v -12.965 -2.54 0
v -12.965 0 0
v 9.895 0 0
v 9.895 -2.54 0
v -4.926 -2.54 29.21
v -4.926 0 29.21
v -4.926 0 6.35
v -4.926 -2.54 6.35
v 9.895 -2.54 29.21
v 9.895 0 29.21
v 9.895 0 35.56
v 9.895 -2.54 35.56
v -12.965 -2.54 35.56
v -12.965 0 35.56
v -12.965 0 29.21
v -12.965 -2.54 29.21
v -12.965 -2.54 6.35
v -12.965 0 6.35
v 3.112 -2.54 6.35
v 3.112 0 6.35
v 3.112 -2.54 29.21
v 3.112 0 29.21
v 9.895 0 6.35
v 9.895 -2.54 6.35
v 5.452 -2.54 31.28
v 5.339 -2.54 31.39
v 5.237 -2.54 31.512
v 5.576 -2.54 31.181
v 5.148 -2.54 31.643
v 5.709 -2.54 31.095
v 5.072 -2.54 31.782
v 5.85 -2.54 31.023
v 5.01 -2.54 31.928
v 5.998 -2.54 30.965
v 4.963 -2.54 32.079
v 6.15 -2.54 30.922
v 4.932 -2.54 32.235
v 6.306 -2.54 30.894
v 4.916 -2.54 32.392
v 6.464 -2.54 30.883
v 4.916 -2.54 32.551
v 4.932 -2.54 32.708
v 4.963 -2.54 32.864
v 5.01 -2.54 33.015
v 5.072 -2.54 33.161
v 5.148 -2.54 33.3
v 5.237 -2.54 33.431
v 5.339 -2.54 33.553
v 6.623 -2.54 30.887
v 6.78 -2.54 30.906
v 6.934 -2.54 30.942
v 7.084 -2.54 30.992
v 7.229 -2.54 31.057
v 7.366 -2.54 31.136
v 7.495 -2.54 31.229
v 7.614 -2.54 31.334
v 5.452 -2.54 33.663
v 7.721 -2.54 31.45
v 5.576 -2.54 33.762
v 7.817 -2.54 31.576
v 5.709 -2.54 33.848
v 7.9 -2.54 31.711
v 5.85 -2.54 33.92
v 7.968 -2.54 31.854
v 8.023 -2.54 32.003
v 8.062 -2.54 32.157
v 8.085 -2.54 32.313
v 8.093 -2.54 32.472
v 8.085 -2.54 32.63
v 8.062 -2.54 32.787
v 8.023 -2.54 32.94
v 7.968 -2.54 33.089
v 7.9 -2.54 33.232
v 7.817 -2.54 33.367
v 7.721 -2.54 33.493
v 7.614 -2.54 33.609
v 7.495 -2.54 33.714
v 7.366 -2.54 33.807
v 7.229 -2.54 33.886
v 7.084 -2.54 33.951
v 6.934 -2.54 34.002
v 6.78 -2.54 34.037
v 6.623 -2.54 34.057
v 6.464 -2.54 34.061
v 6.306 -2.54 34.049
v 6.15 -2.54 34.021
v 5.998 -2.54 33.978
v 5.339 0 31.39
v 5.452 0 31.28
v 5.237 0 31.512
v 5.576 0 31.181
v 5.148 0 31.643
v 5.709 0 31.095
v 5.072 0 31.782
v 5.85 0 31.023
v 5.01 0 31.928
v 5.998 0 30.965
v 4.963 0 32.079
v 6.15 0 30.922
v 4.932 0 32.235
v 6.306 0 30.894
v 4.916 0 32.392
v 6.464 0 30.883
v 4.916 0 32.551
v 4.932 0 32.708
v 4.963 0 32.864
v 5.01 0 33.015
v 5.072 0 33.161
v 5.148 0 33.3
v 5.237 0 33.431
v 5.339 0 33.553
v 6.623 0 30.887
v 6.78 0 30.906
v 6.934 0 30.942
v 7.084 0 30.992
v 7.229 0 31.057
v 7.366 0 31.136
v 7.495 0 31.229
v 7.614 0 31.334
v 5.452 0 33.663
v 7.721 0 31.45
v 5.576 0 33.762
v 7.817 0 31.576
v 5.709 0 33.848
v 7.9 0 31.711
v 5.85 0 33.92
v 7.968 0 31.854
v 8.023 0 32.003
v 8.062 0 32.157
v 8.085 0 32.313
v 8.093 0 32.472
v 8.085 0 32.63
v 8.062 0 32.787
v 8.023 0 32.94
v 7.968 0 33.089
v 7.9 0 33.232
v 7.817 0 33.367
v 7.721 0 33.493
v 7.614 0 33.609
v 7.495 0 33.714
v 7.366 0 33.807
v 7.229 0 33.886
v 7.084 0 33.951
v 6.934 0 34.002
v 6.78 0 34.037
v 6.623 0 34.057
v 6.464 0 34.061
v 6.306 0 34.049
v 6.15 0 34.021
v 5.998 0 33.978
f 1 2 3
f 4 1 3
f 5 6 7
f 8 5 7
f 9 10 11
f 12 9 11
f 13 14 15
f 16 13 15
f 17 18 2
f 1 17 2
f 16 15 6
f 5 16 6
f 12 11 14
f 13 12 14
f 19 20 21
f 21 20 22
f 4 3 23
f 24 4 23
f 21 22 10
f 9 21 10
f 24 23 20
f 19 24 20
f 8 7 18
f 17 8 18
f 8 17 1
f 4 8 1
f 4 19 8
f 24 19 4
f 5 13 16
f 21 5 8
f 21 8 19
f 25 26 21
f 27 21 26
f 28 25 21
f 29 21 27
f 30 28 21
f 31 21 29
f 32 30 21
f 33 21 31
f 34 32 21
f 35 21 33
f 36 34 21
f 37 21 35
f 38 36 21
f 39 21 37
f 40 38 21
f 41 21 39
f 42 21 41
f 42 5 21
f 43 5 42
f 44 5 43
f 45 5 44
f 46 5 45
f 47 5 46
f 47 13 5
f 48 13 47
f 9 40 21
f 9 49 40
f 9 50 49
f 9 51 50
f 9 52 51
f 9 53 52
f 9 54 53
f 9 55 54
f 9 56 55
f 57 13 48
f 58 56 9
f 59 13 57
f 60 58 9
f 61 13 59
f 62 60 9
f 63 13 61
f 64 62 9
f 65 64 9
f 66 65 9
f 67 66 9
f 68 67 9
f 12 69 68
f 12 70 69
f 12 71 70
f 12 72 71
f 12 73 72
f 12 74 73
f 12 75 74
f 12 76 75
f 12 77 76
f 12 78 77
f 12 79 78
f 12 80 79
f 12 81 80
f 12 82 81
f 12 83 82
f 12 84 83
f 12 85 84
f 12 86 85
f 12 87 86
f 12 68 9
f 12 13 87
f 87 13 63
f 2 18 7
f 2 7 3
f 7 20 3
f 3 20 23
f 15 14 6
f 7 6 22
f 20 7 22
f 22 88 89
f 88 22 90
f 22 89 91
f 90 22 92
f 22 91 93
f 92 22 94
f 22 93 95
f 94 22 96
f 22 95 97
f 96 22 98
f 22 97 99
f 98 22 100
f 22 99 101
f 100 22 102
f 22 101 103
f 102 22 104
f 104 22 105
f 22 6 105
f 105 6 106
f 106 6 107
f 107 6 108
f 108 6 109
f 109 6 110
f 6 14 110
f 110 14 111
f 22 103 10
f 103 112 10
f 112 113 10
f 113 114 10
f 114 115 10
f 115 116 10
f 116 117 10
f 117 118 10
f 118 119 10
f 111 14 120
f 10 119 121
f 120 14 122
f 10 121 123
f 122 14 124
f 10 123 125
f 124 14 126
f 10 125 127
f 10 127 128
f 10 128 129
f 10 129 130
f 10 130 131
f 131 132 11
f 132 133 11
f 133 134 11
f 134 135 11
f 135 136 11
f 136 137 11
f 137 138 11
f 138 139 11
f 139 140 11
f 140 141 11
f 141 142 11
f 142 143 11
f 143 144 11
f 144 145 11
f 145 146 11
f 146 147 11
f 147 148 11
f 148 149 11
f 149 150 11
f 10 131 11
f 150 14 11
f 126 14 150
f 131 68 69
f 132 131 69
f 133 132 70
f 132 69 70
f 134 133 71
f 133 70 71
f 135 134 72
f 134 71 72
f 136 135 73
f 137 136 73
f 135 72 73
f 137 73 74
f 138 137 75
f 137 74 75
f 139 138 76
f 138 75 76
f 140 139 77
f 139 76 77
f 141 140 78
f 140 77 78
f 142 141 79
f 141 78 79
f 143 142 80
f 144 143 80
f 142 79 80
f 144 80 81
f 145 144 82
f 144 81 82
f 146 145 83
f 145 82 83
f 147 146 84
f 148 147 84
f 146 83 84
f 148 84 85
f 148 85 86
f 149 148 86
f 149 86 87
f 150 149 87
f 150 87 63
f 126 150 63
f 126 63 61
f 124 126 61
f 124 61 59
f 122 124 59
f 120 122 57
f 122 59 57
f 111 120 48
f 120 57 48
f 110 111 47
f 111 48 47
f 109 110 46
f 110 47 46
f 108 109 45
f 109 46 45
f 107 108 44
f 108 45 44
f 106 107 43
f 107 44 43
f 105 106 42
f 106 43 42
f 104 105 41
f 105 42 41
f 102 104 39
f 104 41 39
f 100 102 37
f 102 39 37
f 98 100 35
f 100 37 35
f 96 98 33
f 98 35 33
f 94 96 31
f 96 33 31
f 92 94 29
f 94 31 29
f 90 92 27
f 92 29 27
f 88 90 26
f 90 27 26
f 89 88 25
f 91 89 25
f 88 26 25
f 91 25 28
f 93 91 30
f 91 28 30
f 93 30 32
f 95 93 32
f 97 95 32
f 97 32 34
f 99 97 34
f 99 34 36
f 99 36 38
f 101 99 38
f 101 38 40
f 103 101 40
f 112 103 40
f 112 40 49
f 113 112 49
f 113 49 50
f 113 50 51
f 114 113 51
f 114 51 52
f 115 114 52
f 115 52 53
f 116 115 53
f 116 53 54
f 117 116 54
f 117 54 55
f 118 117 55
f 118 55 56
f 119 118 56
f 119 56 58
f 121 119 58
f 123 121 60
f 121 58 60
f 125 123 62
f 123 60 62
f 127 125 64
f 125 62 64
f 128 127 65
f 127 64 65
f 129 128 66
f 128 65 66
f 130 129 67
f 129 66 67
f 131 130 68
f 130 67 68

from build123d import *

# Parameters (mm, degrees)
F1_DEPTH = 2.54
F2_R     = 1.589484
F3_DEPTH = 2.54


with BuildPart() as f1:
    # F0 (on Front) → F1 (new body)
    with BuildSketch(Plane.XZ):
        Polygon((-12.964887, 6.35), (-12.964887, 0), (9.895113, 0), (9.895113, 6.35), (3.112477, 6.35), (3.112477, 29.21), (9.895113, 29.21), (9.895113, 35.56), (-12.964887, 35.56), (-12.964887, 29.21), (-4.926205, 29.21), (-4.926205, 6.35), align=None)
    extrude(amount=F1_DEPTH)

    # F2 (on face) → F3 (cut)
    with BuildSketch(Plane.XZ.offset(2.54)):
        with Locations((6.503795, 32.47159)):
            Circle(F2_R)
    extrude(amount=-F3_DEPTH, mode=Mode.SUBTRACT)


solid = f1.part
